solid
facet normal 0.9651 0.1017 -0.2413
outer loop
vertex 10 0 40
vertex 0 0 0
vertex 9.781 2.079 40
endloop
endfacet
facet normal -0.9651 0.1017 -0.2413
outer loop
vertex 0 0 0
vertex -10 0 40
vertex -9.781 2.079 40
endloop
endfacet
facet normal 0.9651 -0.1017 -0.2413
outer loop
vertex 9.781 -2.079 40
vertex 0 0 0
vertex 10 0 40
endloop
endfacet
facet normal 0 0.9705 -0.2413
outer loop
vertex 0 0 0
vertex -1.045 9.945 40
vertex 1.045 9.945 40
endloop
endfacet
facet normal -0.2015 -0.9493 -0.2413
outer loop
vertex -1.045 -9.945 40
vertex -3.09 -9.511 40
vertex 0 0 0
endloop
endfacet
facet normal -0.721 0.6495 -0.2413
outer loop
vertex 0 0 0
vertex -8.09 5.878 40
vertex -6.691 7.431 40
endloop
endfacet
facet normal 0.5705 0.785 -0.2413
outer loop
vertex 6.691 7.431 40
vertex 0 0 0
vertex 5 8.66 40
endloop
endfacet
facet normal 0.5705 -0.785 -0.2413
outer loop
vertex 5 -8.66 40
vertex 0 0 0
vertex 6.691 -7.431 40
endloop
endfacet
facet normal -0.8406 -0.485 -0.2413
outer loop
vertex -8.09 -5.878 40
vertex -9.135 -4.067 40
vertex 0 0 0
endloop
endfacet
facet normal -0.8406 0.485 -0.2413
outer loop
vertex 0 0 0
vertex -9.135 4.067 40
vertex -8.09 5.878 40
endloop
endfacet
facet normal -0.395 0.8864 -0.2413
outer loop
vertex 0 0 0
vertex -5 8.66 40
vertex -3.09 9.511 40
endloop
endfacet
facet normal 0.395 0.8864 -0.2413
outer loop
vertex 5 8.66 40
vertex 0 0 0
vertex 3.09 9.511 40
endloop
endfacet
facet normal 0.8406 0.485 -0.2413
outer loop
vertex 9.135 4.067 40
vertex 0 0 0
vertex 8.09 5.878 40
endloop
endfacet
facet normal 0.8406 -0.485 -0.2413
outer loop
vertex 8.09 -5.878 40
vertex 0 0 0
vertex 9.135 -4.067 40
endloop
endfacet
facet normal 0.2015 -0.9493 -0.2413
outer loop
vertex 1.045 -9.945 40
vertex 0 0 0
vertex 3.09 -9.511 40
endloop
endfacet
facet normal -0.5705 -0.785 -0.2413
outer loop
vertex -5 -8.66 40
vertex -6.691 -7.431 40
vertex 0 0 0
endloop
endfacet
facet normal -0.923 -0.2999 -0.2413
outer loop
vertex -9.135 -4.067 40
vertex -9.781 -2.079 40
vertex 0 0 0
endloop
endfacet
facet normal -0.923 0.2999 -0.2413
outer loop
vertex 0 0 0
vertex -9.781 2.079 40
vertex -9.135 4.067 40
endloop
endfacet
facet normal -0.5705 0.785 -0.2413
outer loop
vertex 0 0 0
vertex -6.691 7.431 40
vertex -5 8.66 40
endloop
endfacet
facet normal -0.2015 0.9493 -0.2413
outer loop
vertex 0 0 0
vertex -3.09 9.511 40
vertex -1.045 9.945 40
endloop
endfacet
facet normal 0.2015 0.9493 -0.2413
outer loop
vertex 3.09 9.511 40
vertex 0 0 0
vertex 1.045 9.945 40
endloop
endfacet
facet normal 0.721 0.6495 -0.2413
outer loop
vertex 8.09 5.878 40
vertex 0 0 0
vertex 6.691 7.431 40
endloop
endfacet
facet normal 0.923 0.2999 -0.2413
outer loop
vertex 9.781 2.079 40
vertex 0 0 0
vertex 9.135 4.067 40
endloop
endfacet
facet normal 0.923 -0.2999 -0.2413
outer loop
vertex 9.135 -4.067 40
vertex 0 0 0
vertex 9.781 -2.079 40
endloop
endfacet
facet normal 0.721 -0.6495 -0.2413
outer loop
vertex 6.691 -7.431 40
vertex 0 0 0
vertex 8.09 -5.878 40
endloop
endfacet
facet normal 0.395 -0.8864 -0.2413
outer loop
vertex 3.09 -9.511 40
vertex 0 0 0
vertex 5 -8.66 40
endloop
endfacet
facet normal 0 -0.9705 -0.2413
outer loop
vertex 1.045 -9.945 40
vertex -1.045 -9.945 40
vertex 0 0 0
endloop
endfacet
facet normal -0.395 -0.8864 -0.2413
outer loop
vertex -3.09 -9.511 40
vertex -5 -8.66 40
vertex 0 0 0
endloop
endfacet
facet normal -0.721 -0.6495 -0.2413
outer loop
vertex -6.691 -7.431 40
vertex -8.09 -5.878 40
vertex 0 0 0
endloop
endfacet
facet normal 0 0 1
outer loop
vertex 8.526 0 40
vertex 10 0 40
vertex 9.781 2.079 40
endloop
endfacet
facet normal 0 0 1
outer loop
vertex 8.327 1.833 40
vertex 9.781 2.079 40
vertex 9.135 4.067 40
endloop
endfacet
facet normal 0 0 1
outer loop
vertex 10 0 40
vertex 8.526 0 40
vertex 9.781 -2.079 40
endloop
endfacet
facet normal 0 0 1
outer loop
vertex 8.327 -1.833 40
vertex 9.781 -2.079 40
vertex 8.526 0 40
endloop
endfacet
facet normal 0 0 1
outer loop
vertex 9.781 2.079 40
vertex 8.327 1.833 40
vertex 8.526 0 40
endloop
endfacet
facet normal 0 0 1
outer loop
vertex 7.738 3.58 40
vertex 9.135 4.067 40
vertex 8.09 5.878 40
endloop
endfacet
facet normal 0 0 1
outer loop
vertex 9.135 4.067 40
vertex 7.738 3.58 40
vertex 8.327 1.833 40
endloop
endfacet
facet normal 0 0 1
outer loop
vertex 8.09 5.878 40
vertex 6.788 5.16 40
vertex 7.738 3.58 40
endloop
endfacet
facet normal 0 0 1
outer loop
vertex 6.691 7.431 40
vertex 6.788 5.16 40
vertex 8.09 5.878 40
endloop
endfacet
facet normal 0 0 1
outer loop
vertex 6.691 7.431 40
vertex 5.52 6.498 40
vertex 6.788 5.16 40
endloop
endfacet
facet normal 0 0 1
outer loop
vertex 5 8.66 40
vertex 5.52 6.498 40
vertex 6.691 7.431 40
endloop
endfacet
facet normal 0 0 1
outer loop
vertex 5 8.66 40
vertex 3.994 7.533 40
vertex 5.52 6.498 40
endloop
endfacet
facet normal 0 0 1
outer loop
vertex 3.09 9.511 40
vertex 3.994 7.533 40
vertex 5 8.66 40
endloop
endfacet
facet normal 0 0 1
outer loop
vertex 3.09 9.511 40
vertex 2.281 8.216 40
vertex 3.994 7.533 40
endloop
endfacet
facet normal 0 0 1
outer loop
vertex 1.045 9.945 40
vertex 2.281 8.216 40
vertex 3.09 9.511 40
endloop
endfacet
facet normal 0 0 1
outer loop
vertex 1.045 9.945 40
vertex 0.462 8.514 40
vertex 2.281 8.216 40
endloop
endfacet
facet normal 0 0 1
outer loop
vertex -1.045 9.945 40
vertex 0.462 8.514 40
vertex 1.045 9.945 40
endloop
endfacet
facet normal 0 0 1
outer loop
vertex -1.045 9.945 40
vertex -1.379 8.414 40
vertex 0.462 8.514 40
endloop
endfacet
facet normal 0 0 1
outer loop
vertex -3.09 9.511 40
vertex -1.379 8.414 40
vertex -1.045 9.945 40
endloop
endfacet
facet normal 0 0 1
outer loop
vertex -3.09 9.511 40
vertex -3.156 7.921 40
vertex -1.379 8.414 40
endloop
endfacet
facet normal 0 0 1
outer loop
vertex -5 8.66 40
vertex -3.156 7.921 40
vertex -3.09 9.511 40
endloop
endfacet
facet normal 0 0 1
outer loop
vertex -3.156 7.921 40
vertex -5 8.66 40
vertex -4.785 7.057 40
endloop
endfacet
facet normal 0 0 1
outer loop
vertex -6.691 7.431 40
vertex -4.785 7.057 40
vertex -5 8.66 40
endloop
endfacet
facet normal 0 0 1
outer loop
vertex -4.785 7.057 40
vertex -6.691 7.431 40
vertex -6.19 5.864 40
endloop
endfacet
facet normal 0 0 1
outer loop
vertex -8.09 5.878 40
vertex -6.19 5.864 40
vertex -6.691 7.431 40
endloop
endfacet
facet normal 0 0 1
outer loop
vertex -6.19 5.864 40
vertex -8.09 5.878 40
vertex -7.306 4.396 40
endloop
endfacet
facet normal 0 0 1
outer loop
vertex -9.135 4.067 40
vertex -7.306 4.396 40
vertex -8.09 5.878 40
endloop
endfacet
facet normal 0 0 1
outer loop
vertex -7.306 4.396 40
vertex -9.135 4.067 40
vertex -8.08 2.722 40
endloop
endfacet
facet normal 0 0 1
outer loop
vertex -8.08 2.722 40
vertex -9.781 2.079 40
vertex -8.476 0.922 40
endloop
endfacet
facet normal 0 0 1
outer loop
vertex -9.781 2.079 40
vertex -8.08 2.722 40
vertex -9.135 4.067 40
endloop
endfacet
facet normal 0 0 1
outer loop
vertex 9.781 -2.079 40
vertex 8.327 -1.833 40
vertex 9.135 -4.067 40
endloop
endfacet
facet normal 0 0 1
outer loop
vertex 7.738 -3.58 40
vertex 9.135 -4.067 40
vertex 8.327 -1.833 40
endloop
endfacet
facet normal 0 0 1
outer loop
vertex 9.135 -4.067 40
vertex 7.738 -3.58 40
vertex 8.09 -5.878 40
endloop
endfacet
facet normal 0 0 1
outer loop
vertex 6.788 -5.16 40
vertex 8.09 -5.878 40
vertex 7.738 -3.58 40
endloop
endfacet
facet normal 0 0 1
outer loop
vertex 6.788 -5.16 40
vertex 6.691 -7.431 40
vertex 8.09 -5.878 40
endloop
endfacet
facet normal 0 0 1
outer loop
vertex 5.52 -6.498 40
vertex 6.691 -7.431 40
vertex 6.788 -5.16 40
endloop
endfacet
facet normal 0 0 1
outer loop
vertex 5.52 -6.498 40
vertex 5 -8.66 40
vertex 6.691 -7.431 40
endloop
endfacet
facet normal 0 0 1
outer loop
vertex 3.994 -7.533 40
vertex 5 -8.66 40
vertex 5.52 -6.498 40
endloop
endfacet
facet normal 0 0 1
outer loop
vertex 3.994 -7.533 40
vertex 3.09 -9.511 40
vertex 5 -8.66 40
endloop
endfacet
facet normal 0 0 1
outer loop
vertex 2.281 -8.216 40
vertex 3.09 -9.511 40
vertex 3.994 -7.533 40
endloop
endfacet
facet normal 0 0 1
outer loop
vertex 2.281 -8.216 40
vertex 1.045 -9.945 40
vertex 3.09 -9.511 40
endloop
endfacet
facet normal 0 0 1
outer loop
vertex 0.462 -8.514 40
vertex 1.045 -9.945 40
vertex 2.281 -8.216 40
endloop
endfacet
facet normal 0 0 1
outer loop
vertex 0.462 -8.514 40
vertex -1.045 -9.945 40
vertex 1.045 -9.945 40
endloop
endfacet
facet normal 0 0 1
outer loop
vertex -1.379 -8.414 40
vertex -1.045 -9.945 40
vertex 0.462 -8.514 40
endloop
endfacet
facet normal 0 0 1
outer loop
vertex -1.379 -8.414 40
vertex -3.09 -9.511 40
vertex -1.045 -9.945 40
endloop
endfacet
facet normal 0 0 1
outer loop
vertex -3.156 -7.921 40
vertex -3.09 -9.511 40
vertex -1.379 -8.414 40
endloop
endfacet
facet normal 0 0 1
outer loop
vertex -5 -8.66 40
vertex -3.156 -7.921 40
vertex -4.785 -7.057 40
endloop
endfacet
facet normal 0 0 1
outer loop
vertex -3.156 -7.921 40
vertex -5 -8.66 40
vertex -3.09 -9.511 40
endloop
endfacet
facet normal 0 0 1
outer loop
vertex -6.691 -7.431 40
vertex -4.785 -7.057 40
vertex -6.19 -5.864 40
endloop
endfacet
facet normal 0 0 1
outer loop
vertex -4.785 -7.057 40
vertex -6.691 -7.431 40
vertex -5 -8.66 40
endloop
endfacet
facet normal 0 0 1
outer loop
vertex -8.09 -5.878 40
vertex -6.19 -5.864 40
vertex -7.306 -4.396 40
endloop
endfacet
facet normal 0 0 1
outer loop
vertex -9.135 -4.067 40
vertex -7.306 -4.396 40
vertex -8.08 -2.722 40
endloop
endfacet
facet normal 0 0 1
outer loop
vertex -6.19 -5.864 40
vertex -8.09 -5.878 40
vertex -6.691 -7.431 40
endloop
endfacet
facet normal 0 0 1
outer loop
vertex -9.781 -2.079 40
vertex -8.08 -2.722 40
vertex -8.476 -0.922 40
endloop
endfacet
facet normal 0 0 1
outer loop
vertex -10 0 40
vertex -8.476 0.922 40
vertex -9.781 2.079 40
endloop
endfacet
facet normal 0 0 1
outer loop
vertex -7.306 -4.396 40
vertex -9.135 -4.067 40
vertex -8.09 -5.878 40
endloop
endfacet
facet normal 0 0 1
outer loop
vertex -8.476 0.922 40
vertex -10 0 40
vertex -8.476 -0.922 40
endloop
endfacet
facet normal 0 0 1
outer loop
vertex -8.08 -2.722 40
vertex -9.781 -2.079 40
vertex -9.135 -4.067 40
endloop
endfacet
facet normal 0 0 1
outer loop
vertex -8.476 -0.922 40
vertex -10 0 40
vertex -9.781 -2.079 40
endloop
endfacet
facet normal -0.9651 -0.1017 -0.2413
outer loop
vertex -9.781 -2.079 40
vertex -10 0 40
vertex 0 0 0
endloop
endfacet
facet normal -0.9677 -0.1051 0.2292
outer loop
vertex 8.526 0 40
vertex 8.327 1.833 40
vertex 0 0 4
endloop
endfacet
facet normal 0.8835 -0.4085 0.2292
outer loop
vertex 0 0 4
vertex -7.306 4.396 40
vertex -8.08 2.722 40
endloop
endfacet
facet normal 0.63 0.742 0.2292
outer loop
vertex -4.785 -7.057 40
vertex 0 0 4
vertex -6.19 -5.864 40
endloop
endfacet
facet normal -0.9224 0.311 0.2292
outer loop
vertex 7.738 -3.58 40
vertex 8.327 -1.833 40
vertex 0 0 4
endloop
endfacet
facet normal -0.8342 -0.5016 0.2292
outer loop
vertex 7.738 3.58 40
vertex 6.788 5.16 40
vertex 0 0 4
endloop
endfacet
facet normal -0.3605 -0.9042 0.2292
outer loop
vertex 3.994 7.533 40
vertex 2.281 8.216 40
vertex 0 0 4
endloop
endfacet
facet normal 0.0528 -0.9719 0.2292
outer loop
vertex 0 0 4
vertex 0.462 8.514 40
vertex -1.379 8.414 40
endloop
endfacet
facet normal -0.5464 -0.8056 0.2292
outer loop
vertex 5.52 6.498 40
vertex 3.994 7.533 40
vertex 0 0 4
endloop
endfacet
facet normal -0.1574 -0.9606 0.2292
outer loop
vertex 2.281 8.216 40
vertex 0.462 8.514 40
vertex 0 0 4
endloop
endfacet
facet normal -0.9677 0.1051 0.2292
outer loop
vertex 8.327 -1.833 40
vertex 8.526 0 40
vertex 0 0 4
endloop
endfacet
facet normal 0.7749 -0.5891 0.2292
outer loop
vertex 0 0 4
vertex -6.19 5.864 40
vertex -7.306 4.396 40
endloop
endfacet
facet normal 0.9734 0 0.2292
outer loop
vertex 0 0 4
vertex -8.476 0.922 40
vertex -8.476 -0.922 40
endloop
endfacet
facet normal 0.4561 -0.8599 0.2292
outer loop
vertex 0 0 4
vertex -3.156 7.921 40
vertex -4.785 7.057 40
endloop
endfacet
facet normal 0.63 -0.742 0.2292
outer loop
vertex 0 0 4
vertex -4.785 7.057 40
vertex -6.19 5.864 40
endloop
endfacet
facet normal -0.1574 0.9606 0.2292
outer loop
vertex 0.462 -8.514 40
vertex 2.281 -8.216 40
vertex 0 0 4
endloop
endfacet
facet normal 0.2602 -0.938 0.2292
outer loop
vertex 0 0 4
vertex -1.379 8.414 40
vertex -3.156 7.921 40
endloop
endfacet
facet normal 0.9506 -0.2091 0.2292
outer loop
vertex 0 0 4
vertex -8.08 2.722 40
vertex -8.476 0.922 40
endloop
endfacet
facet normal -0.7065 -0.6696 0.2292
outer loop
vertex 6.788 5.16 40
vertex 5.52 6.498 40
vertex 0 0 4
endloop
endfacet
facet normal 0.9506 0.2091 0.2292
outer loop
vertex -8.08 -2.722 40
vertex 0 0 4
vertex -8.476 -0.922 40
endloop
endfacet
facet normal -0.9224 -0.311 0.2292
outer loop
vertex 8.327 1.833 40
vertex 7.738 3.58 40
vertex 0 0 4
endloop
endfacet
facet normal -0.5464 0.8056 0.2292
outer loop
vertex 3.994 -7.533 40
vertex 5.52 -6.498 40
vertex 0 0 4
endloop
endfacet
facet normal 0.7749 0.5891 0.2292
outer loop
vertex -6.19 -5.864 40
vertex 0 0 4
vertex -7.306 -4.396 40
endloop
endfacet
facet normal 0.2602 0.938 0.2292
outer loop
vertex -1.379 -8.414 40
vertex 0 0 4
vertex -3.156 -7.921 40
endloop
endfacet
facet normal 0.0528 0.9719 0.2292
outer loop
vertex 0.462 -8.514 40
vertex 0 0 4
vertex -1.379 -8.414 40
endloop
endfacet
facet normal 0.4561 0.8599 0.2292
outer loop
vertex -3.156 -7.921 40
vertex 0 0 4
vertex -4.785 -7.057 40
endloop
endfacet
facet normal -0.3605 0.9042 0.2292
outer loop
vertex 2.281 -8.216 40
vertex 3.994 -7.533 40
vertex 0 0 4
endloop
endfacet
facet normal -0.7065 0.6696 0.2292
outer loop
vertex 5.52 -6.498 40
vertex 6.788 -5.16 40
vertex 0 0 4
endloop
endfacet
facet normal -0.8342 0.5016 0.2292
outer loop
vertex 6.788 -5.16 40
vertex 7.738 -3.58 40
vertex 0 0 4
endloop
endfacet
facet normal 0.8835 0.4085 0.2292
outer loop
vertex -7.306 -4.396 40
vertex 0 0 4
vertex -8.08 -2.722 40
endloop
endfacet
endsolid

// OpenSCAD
// 3D Shapes- Design Time: Ice Cream Cone

difference() {
    cylinder(h=40, r1=0, r2=10);
    translate([0, 0, 4]) cylinder(h=38, r1=0, r2=9);
}
